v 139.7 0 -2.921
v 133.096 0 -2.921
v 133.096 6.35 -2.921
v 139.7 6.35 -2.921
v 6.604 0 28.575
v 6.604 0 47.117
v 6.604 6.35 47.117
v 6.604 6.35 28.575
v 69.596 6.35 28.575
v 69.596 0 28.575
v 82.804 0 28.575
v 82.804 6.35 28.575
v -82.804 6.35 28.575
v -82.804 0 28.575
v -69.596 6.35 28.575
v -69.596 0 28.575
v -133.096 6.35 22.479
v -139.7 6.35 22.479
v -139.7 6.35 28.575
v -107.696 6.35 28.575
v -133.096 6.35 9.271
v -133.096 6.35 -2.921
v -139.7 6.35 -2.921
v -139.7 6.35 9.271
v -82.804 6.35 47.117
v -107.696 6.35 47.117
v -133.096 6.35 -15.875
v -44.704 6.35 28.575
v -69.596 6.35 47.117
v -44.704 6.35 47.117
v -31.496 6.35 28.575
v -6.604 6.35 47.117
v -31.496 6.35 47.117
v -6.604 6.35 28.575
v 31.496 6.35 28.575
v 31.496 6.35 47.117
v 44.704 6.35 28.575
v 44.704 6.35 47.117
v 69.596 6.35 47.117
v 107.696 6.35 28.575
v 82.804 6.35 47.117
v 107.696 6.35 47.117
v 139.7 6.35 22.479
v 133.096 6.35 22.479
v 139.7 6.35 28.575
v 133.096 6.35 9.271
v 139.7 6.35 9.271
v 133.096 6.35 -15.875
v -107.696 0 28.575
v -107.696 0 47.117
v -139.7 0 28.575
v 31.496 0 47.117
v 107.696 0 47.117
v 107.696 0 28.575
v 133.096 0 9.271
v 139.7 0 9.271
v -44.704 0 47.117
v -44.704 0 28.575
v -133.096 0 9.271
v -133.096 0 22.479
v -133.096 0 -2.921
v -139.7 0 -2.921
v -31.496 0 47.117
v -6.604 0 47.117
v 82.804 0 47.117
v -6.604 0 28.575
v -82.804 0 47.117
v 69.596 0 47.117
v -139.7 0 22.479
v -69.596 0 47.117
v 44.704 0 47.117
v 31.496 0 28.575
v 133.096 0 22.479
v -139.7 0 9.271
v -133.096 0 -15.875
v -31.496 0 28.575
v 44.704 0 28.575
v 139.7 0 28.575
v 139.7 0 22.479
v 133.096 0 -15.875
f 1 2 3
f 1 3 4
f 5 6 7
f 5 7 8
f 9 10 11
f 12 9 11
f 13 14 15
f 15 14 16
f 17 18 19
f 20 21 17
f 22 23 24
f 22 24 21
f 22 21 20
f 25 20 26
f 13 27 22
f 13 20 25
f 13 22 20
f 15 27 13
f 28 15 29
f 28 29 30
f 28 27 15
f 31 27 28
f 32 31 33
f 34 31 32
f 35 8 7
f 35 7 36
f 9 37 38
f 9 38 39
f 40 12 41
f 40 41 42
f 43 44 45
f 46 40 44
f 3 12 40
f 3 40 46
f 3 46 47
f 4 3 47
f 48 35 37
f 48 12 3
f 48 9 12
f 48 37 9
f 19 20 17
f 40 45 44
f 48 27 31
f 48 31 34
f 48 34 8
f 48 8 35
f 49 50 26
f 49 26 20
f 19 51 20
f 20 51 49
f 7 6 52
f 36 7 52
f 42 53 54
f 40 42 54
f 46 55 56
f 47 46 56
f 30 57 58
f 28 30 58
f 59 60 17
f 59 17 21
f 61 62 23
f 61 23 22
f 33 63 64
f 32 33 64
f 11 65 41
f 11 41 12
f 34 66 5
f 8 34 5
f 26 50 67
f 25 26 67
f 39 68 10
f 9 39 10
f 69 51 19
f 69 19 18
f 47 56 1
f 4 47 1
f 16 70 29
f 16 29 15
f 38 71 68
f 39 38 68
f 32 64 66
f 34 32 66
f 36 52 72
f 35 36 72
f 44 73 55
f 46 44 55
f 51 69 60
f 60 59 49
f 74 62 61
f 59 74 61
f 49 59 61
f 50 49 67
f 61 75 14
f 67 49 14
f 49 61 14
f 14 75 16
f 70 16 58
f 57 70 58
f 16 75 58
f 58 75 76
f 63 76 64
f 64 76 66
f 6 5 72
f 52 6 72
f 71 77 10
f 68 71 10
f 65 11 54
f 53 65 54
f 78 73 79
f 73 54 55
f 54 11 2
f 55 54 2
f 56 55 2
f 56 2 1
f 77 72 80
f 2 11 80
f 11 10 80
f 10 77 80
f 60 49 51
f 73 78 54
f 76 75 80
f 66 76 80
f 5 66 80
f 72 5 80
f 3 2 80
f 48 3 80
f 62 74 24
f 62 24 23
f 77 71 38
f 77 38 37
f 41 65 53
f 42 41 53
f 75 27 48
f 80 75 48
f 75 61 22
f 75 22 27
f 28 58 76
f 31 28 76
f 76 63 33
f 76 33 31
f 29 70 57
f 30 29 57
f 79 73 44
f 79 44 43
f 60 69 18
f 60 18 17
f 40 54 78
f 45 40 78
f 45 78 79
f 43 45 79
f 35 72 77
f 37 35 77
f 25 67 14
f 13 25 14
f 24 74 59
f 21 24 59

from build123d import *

# Parameters (mm, degrees)
SKETCH1_W           = 279.4
SKETCH1_H           = 57.15
BOSS_EXTRUDE1_DEPTH = 6.35
SKETCH3_W           = 24.892
SKETCH3_H           = 18.542
BOSS_EXTRUDE2_DEPTH = 6.35
SKETCH4_W           = 13.208
SKETCH4_H           = 13.208
CUT_EXTRUDE2_DEPTH  = 148.568371235
SKETCH5_W           = 311.517575851
SKETCH5_H           = 12.7
CUT_EXTRUDE3_DEPTH  = 148.568371235


with BuildPart() as part:
    # Sketch1 → Boss-Extrude1 (new body)
    with BuildSketch(Plane(origin=(0, 0, 0), x_dir=(1, 0, 0), z_dir=(0, 1, 0))):
        Rectangle(SKETCH1_W, SKETCH1_H)
    extrude(amount=BOSS_EXTRUDE1_DEPTH)

    # Sketch3 → Boss-Extrude2 (add)
    with BuildSketch(Plane(origin=(0, 0, 0), x_dir=(1, 0, 0), z_dir=(0, 1, 0))):
        with Locations((-95.25, -37.846)):
            Rectangle(SKETCH3_W, SKETCH3_H)
        with Locations((-57.15, -37.846)):
            Rectangle(SKETCH3_W, SKETCH3_H)
        with Locations((-19.05, -37.846)):
            Rectangle(SKETCH3_W, SKETCH3_H)
        with Locations((19.05, -37.846)):
            Rectangle(SKETCH3_W, SKETCH3_H)
        with Locations((57.15, -37.846)):
            Rectangle(SKETCH3_W, SKETCH3_H)
        with Locations((95.25, -37.846)):
            Rectangle(SKETCH3_W, SKETCH3_H)
    extrude(amount=BOSS_EXTRUDE2_DEPTH)

    # Sketch4 → Cut-Extrude2 (cut, through all)
    with BuildSketch(Plane(origin=(0, 0, 0), x_dir=(1, 0, 0), z_dir=(0, 1, 0))):
        with Locations((-139.7, 9.525)):
            Rectangle(SKETCH4_W, SKETCH4_H)
        with Locations((-139.7, -15.875)):
            Rectangle(SKETCH4_W, SKETCH4_H)
        with Locations((139.7, -15.875)):
            Rectangle(SKETCH4_W, SKETCH4_H)
        with Locations((139.7, 9.525)):
            Rectangle(SKETCH4_W, SKETCH4_H)
    extrude(amount=CUT_EXTRUDE2_DEPTH, mode=Mode.SUBTRACT)

    # Sketch5 → Cut-Extrude3 (cut, through all)
    with BuildSketch(Plane(origin=(0, 6.35, 0), x_dir=(1, 0, 0), z_dir=(0, 1, 0))):
        with Locations((16.058787925, 22.225)):
            Rectangle(SKETCH5_W, SKETCH5_H)
    extrude(amount=-CUT_EXTRUDE3_DEPTH, mode=Mode.SUBTRACT)


solid = part.part
